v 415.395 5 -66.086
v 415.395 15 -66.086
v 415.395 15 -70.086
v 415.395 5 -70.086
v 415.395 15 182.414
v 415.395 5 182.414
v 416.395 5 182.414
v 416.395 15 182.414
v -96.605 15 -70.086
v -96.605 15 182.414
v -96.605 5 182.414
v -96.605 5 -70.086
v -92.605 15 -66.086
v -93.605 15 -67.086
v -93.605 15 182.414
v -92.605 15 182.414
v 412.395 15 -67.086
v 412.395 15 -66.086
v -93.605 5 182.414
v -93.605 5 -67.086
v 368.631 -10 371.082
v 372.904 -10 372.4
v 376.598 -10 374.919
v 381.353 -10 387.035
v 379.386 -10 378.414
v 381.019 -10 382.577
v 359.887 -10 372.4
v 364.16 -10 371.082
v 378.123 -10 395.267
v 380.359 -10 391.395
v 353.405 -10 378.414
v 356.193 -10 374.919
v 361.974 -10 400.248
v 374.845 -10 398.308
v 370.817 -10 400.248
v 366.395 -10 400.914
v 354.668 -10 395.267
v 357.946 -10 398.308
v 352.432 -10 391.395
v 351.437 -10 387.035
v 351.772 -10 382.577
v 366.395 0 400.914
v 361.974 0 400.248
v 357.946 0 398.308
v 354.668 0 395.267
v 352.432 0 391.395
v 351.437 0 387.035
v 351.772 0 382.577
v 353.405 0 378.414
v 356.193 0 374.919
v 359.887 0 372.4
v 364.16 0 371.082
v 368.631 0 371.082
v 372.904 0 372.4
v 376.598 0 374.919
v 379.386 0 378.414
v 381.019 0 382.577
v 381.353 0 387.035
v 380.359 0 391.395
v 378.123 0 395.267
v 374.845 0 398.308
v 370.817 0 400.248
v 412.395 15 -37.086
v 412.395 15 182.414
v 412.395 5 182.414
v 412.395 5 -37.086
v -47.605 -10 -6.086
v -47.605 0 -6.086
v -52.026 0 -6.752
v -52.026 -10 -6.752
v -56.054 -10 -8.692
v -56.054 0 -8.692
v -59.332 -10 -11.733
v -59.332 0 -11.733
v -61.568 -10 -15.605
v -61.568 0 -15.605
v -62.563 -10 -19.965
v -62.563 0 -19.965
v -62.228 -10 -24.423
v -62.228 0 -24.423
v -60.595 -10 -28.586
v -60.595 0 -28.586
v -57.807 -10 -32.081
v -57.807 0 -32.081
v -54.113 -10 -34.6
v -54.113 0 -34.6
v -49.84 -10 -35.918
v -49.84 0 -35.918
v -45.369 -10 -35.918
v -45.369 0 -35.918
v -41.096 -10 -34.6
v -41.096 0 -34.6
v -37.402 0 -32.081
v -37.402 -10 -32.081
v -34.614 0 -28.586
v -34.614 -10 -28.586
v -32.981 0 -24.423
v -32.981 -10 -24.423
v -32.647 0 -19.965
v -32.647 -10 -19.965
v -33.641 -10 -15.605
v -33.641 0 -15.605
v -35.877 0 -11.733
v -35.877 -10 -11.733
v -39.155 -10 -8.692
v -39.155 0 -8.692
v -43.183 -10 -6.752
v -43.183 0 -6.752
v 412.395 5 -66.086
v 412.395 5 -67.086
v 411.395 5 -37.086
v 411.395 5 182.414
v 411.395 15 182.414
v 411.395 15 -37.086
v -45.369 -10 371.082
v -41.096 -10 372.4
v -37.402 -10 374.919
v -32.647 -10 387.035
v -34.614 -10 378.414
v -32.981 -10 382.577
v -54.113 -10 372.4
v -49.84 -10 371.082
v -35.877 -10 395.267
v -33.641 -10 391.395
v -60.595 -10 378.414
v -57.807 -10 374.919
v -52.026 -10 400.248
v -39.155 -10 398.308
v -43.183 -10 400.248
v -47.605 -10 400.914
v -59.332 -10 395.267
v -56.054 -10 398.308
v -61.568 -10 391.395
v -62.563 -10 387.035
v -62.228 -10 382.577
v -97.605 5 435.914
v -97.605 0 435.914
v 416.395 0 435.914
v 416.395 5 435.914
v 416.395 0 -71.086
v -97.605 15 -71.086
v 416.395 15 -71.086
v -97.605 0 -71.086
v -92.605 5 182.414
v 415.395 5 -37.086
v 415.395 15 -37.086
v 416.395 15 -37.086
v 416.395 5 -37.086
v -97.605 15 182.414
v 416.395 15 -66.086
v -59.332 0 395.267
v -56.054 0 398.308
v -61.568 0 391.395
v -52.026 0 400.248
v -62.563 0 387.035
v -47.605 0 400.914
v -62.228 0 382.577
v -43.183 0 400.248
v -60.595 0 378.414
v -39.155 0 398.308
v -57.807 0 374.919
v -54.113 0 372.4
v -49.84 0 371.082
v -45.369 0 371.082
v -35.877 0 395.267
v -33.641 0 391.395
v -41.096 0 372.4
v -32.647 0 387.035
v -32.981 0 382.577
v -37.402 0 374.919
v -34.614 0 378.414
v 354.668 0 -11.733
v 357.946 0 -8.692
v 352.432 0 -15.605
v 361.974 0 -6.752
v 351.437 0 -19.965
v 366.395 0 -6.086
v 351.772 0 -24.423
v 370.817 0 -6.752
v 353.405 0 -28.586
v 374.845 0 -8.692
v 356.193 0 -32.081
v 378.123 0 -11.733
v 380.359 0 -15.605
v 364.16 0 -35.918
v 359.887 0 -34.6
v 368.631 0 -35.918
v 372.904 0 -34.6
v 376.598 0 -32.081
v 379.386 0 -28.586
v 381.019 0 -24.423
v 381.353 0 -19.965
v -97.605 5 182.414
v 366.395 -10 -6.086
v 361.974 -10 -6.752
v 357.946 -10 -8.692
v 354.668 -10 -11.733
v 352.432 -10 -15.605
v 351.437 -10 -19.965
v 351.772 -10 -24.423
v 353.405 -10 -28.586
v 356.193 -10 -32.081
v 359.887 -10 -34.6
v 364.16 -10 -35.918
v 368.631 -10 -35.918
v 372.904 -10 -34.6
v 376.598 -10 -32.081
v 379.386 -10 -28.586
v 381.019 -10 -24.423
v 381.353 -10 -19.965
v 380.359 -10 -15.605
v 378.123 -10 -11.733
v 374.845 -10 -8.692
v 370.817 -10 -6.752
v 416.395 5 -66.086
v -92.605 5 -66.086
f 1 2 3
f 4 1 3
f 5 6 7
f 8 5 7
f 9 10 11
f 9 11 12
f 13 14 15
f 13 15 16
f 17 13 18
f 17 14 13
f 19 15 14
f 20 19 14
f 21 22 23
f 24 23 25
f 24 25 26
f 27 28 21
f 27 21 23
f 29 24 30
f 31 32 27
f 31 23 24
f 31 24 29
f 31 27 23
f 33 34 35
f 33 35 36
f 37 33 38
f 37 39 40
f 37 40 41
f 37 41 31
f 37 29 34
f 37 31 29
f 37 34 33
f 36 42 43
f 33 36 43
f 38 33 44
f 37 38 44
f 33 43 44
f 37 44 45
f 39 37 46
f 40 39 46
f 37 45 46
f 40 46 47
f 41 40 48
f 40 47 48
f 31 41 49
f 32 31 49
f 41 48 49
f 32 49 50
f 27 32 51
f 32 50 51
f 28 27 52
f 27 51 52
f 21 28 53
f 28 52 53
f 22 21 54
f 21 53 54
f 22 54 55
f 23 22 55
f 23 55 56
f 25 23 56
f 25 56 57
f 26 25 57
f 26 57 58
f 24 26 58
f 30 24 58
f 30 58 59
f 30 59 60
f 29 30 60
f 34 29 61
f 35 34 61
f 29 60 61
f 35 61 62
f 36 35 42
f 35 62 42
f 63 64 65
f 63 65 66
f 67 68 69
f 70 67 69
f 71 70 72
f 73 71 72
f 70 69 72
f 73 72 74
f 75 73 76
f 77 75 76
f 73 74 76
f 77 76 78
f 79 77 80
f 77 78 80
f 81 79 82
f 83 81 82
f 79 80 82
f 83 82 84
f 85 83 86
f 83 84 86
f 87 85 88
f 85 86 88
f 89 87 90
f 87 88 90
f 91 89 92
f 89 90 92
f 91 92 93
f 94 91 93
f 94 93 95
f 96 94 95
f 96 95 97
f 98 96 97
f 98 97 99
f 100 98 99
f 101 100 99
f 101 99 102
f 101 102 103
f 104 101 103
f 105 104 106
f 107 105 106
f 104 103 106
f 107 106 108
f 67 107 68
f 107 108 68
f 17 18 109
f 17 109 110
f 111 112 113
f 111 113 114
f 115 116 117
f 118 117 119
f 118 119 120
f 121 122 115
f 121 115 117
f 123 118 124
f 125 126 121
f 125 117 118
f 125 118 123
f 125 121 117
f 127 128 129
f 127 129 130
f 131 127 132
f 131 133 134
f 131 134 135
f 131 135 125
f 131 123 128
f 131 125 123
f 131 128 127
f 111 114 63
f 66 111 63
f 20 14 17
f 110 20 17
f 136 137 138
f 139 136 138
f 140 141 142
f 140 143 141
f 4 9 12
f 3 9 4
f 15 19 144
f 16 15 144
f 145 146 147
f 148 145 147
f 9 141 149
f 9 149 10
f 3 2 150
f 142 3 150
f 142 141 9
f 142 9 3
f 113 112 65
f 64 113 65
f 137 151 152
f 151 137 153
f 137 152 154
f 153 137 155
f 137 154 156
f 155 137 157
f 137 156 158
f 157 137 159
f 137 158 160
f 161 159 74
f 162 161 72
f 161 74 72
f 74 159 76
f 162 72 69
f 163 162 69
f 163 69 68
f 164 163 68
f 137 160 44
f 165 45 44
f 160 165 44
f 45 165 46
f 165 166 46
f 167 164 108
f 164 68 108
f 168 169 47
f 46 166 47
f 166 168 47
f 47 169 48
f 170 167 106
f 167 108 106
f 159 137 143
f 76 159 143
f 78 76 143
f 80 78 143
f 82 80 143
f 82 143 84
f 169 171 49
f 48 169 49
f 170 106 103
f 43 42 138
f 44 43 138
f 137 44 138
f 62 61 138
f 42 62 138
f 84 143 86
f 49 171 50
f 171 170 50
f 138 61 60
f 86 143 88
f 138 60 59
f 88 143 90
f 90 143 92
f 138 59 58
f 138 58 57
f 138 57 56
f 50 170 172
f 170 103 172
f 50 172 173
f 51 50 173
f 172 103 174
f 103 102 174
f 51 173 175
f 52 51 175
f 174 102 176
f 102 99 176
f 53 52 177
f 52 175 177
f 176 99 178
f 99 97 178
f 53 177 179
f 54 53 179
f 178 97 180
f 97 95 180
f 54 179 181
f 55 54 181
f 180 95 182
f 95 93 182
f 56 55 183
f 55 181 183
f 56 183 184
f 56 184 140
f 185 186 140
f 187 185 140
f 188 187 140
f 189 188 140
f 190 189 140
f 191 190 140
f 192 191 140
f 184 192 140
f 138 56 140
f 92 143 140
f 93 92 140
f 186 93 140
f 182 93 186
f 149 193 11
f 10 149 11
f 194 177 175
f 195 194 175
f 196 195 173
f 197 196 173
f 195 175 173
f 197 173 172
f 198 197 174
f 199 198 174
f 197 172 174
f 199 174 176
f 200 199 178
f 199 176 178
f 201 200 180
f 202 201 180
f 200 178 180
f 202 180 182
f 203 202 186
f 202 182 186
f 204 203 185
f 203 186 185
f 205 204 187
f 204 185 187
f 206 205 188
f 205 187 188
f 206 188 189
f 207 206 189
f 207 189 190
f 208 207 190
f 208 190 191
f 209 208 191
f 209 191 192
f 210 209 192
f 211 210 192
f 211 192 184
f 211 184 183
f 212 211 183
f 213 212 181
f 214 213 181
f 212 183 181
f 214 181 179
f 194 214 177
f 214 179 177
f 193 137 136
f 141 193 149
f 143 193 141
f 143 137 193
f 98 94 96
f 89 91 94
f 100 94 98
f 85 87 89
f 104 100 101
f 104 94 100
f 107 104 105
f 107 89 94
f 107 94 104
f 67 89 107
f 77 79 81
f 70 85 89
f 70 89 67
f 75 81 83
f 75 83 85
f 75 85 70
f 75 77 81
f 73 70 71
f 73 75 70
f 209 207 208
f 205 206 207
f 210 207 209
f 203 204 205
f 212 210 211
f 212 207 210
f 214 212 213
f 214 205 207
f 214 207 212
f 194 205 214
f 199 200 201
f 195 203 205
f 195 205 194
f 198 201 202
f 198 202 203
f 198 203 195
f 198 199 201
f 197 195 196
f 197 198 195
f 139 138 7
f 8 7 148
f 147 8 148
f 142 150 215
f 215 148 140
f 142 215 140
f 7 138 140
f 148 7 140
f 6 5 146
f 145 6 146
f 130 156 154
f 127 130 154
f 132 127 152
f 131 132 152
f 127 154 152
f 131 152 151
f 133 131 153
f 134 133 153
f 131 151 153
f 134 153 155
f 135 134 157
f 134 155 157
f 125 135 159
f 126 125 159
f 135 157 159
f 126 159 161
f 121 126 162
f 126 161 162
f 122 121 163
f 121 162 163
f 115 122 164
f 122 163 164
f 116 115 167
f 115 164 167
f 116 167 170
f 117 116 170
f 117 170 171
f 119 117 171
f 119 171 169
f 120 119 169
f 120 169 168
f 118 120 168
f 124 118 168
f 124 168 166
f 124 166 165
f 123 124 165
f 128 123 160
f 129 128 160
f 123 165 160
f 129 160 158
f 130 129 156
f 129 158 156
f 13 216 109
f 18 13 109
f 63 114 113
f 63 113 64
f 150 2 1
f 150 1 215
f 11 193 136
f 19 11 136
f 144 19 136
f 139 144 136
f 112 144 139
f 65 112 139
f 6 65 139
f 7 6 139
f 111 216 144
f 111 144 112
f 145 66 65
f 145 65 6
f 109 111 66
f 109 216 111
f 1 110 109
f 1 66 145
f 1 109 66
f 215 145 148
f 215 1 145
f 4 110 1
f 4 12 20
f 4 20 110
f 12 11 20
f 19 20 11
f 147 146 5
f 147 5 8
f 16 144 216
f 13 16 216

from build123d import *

# Parameters (mm, degrees)
ESBO_O1_W                = 514
ESBO_O1_H                = 507
RESSALTO_EXTRUS_O1_DEPTH = 5
ESBO_O2_W                = 5
ESBO_O2_H                = 253.5
RESSALTO_EXTRUS_O2_DEPTH = 10
ESBO_O6_W                = 5
ESBO_O6_H                = 253.5
RESSALTO_EXTRUS_O3_DEPTH = 10
ESBO_O7_W                = 3
ESBO_O7_H                = 253.5
CORTE_EXTRUS_O1_DEPTH    = 10
ESBO_O9_W                = 3
ESBO_O9_H                = 253.5
CORTE_EXTRUS_O3_DEPTH    = 10
ESBO_O10_W               = 514
ESBO_O10_H               = 5
RESSALTO_EXTRUS_O4_DEPTH = 10
ESBO_O15_W               = 512
ESBO_O15_H               = 3
CORTE_EXTRUS_O11_DEPTH   = 10
ESBO_O16_W               = 3
ESBO_O16_H               = 1
CORTE_EXTRUS_O12_DEPTH   = 10
ESBO_O20_R               = 15
RESSALTO_EXTRUS_O5_DEPTH = 10
ESBO_O21_W               = 1
ESBO_O21_H               = 29
CORTE_EXTRUS_O13_DEPTH   = 10


with BuildPart() as part:
    # Esboço1 → Ressalto-extrusão1 (new body)
    with BuildSketch(Plane(origin=(0, 0, 0), x_dir=(1, 0, 0), z_dir=(0, 1, 0))):
        with Locations((159.395426849, -182.414405214)):
            Rectangle(ESBO_O1_W, ESBO_O1_H)
    extrude(amount=RESSALTO_EXTRUS_O1_DEPTH)

    # Esboço2 → Ressalto-extrusão2 (add)
    with BuildSketch(Plane(origin=(0, 5, 0), x_dir=(1, 0, 0), z_dir=(0, 1, 0))):
        with Locations((-95.104573151, -55.664405214)):
            Rectangle(ESBO_O2_W, ESBO_O2_H)
    extrude(amount=RESSALTO_EXTRUS_O2_DEPTH)

    # Esboço6 → Ressalto-extrusão3 (add)
    with BuildSketch(Plane(origin=(0, 5, 0), x_dir=(1, 0, 0), z_dir=(0, 1, 0))):
        with Locations((413.895426849, -55.664405214)):
            Rectangle(ESBO_O6_W, ESBO_O6_H)
    extrude(amount=RESSALTO_EXTRUS_O3_DEPTH)

    # Esboço7 → Corte-extrusão1 (cut)
    with BuildSketch(Plane(origin=(0, 15, 0), x_dir=(1, 0, 0), z_dir=(0, 1, 0))):
        with Locations((-95.104573151, -55.664405214)):
            Rectangle(ESBO_O7_W, ESBO_O7_H)
    extrude(amount=-CORTE_EXTRUS_O1_DEPTH, mode=Mode.SUBTRACT)

    # Esboço9 → Corte-extrusão3 (cut)
    with BuildSketch(Plane(origin=(0, 15, 0), x_dir=(1, 0, 0), z_dir=(0, 1, 0))):
        with Locations((413.895426849, -55.664405214)):
            Rectangle(ESBO_O9_W, ESBO_O9_H)
    extrude(amount=-CORTE_EXTRUS_O3_DEPTH, mode=Mode.SUBTRACT)

    # Esboço10 → Ressalto-extrusão4 (add)
    with BuildSketch(Plane(origin=(0, 5, 0), x_dir=(1, 0, 0), z_dir=(0, 1, 0))):
        with Locations((159.395426849, 68.585594786)):
            Rectangle(ESBO_O10_W, ESBO_O10_H)
    extrude(amount=RESSALTO_EXTRUS_O4_DEPTH)

    # Esboço15 → Corte-extrusão11 (cut)
    with BuildSketch(Plane(origin=(0, 15, 0), x_dir=(1, 0, 0), z_dir=(0, 1, 0))):
        with Locations((159.395426849, 68.585594786)):
            Rectangle(ESBO_O15_W, ESBO_O15_H)
    extrude(amount=-CORTE_EXTRUS_O11_DEPTH, mode=Mode.SUBTRACT)

    # Esboço16 → Corte-extrusão12 (cut)
    with BuildSketch(Plane(origin=(0, 15, 0), x_dir=(1, 0, 0), z_dir=(0, 1, 0))):
        with Locations((413.895426849, 66.585594786)):
            Rectangle(ESBO_O16_W, ESBO_O16_H)
        with Locations((-95.104573151, 66.585594786)):
            Rectangle(ESBO_O16_W, ESBO_O16_H)
    extrude(amount=-CORTE_EXTRUS_O12_DEPTH, mode=Mode.SUBTRACT)

    # Esboço20 → Ressalto-extrusão5 (add)
    with BuildSketch(Plane.XZ):
        with Locations(Location((-47.604573151, 385.914405214, 0), (0, 0, 90))):
            Circle(ESBO_O20_R)
        with Locations(Location((366.395426849, 385.914405214, 0), (0, 0, 90))):
            Circle(ESBO_O20_R)
        with Locations(Location((366.395426849, -21.085594786, 0), (0, 0, 90))):
            Circle(ESBO_O20_R)
        with Locations(Location((-47.604573151, -21.085594786, 0), (0, 0, 90))):
            Circle(ESBO_O20_R)
    extrude(amount=RESSALTO_EXTRUS_O5_DEPTH)

    # Esboço21 → Corte-extrusão13 (cut)
    with BuildSketch(Plane(origin=(0, 15, 0), x_dir=(1, 0, 0), z_dir=(0, 1, 0))):
        with Locations((411.895426849, 51.585594786)):
            Rectangle(ESBO_O21_W, ESBO_O21_H)
        with Locations((415.895426849, 51.585594786)):
            Rectangle(ESBO_O21_W, ESBO_O21_H)
    extrude(amount=-CORTE_EXTRUS_O13_DEPTH, mode=Mode.SUBTRACT)


solid = part.part
